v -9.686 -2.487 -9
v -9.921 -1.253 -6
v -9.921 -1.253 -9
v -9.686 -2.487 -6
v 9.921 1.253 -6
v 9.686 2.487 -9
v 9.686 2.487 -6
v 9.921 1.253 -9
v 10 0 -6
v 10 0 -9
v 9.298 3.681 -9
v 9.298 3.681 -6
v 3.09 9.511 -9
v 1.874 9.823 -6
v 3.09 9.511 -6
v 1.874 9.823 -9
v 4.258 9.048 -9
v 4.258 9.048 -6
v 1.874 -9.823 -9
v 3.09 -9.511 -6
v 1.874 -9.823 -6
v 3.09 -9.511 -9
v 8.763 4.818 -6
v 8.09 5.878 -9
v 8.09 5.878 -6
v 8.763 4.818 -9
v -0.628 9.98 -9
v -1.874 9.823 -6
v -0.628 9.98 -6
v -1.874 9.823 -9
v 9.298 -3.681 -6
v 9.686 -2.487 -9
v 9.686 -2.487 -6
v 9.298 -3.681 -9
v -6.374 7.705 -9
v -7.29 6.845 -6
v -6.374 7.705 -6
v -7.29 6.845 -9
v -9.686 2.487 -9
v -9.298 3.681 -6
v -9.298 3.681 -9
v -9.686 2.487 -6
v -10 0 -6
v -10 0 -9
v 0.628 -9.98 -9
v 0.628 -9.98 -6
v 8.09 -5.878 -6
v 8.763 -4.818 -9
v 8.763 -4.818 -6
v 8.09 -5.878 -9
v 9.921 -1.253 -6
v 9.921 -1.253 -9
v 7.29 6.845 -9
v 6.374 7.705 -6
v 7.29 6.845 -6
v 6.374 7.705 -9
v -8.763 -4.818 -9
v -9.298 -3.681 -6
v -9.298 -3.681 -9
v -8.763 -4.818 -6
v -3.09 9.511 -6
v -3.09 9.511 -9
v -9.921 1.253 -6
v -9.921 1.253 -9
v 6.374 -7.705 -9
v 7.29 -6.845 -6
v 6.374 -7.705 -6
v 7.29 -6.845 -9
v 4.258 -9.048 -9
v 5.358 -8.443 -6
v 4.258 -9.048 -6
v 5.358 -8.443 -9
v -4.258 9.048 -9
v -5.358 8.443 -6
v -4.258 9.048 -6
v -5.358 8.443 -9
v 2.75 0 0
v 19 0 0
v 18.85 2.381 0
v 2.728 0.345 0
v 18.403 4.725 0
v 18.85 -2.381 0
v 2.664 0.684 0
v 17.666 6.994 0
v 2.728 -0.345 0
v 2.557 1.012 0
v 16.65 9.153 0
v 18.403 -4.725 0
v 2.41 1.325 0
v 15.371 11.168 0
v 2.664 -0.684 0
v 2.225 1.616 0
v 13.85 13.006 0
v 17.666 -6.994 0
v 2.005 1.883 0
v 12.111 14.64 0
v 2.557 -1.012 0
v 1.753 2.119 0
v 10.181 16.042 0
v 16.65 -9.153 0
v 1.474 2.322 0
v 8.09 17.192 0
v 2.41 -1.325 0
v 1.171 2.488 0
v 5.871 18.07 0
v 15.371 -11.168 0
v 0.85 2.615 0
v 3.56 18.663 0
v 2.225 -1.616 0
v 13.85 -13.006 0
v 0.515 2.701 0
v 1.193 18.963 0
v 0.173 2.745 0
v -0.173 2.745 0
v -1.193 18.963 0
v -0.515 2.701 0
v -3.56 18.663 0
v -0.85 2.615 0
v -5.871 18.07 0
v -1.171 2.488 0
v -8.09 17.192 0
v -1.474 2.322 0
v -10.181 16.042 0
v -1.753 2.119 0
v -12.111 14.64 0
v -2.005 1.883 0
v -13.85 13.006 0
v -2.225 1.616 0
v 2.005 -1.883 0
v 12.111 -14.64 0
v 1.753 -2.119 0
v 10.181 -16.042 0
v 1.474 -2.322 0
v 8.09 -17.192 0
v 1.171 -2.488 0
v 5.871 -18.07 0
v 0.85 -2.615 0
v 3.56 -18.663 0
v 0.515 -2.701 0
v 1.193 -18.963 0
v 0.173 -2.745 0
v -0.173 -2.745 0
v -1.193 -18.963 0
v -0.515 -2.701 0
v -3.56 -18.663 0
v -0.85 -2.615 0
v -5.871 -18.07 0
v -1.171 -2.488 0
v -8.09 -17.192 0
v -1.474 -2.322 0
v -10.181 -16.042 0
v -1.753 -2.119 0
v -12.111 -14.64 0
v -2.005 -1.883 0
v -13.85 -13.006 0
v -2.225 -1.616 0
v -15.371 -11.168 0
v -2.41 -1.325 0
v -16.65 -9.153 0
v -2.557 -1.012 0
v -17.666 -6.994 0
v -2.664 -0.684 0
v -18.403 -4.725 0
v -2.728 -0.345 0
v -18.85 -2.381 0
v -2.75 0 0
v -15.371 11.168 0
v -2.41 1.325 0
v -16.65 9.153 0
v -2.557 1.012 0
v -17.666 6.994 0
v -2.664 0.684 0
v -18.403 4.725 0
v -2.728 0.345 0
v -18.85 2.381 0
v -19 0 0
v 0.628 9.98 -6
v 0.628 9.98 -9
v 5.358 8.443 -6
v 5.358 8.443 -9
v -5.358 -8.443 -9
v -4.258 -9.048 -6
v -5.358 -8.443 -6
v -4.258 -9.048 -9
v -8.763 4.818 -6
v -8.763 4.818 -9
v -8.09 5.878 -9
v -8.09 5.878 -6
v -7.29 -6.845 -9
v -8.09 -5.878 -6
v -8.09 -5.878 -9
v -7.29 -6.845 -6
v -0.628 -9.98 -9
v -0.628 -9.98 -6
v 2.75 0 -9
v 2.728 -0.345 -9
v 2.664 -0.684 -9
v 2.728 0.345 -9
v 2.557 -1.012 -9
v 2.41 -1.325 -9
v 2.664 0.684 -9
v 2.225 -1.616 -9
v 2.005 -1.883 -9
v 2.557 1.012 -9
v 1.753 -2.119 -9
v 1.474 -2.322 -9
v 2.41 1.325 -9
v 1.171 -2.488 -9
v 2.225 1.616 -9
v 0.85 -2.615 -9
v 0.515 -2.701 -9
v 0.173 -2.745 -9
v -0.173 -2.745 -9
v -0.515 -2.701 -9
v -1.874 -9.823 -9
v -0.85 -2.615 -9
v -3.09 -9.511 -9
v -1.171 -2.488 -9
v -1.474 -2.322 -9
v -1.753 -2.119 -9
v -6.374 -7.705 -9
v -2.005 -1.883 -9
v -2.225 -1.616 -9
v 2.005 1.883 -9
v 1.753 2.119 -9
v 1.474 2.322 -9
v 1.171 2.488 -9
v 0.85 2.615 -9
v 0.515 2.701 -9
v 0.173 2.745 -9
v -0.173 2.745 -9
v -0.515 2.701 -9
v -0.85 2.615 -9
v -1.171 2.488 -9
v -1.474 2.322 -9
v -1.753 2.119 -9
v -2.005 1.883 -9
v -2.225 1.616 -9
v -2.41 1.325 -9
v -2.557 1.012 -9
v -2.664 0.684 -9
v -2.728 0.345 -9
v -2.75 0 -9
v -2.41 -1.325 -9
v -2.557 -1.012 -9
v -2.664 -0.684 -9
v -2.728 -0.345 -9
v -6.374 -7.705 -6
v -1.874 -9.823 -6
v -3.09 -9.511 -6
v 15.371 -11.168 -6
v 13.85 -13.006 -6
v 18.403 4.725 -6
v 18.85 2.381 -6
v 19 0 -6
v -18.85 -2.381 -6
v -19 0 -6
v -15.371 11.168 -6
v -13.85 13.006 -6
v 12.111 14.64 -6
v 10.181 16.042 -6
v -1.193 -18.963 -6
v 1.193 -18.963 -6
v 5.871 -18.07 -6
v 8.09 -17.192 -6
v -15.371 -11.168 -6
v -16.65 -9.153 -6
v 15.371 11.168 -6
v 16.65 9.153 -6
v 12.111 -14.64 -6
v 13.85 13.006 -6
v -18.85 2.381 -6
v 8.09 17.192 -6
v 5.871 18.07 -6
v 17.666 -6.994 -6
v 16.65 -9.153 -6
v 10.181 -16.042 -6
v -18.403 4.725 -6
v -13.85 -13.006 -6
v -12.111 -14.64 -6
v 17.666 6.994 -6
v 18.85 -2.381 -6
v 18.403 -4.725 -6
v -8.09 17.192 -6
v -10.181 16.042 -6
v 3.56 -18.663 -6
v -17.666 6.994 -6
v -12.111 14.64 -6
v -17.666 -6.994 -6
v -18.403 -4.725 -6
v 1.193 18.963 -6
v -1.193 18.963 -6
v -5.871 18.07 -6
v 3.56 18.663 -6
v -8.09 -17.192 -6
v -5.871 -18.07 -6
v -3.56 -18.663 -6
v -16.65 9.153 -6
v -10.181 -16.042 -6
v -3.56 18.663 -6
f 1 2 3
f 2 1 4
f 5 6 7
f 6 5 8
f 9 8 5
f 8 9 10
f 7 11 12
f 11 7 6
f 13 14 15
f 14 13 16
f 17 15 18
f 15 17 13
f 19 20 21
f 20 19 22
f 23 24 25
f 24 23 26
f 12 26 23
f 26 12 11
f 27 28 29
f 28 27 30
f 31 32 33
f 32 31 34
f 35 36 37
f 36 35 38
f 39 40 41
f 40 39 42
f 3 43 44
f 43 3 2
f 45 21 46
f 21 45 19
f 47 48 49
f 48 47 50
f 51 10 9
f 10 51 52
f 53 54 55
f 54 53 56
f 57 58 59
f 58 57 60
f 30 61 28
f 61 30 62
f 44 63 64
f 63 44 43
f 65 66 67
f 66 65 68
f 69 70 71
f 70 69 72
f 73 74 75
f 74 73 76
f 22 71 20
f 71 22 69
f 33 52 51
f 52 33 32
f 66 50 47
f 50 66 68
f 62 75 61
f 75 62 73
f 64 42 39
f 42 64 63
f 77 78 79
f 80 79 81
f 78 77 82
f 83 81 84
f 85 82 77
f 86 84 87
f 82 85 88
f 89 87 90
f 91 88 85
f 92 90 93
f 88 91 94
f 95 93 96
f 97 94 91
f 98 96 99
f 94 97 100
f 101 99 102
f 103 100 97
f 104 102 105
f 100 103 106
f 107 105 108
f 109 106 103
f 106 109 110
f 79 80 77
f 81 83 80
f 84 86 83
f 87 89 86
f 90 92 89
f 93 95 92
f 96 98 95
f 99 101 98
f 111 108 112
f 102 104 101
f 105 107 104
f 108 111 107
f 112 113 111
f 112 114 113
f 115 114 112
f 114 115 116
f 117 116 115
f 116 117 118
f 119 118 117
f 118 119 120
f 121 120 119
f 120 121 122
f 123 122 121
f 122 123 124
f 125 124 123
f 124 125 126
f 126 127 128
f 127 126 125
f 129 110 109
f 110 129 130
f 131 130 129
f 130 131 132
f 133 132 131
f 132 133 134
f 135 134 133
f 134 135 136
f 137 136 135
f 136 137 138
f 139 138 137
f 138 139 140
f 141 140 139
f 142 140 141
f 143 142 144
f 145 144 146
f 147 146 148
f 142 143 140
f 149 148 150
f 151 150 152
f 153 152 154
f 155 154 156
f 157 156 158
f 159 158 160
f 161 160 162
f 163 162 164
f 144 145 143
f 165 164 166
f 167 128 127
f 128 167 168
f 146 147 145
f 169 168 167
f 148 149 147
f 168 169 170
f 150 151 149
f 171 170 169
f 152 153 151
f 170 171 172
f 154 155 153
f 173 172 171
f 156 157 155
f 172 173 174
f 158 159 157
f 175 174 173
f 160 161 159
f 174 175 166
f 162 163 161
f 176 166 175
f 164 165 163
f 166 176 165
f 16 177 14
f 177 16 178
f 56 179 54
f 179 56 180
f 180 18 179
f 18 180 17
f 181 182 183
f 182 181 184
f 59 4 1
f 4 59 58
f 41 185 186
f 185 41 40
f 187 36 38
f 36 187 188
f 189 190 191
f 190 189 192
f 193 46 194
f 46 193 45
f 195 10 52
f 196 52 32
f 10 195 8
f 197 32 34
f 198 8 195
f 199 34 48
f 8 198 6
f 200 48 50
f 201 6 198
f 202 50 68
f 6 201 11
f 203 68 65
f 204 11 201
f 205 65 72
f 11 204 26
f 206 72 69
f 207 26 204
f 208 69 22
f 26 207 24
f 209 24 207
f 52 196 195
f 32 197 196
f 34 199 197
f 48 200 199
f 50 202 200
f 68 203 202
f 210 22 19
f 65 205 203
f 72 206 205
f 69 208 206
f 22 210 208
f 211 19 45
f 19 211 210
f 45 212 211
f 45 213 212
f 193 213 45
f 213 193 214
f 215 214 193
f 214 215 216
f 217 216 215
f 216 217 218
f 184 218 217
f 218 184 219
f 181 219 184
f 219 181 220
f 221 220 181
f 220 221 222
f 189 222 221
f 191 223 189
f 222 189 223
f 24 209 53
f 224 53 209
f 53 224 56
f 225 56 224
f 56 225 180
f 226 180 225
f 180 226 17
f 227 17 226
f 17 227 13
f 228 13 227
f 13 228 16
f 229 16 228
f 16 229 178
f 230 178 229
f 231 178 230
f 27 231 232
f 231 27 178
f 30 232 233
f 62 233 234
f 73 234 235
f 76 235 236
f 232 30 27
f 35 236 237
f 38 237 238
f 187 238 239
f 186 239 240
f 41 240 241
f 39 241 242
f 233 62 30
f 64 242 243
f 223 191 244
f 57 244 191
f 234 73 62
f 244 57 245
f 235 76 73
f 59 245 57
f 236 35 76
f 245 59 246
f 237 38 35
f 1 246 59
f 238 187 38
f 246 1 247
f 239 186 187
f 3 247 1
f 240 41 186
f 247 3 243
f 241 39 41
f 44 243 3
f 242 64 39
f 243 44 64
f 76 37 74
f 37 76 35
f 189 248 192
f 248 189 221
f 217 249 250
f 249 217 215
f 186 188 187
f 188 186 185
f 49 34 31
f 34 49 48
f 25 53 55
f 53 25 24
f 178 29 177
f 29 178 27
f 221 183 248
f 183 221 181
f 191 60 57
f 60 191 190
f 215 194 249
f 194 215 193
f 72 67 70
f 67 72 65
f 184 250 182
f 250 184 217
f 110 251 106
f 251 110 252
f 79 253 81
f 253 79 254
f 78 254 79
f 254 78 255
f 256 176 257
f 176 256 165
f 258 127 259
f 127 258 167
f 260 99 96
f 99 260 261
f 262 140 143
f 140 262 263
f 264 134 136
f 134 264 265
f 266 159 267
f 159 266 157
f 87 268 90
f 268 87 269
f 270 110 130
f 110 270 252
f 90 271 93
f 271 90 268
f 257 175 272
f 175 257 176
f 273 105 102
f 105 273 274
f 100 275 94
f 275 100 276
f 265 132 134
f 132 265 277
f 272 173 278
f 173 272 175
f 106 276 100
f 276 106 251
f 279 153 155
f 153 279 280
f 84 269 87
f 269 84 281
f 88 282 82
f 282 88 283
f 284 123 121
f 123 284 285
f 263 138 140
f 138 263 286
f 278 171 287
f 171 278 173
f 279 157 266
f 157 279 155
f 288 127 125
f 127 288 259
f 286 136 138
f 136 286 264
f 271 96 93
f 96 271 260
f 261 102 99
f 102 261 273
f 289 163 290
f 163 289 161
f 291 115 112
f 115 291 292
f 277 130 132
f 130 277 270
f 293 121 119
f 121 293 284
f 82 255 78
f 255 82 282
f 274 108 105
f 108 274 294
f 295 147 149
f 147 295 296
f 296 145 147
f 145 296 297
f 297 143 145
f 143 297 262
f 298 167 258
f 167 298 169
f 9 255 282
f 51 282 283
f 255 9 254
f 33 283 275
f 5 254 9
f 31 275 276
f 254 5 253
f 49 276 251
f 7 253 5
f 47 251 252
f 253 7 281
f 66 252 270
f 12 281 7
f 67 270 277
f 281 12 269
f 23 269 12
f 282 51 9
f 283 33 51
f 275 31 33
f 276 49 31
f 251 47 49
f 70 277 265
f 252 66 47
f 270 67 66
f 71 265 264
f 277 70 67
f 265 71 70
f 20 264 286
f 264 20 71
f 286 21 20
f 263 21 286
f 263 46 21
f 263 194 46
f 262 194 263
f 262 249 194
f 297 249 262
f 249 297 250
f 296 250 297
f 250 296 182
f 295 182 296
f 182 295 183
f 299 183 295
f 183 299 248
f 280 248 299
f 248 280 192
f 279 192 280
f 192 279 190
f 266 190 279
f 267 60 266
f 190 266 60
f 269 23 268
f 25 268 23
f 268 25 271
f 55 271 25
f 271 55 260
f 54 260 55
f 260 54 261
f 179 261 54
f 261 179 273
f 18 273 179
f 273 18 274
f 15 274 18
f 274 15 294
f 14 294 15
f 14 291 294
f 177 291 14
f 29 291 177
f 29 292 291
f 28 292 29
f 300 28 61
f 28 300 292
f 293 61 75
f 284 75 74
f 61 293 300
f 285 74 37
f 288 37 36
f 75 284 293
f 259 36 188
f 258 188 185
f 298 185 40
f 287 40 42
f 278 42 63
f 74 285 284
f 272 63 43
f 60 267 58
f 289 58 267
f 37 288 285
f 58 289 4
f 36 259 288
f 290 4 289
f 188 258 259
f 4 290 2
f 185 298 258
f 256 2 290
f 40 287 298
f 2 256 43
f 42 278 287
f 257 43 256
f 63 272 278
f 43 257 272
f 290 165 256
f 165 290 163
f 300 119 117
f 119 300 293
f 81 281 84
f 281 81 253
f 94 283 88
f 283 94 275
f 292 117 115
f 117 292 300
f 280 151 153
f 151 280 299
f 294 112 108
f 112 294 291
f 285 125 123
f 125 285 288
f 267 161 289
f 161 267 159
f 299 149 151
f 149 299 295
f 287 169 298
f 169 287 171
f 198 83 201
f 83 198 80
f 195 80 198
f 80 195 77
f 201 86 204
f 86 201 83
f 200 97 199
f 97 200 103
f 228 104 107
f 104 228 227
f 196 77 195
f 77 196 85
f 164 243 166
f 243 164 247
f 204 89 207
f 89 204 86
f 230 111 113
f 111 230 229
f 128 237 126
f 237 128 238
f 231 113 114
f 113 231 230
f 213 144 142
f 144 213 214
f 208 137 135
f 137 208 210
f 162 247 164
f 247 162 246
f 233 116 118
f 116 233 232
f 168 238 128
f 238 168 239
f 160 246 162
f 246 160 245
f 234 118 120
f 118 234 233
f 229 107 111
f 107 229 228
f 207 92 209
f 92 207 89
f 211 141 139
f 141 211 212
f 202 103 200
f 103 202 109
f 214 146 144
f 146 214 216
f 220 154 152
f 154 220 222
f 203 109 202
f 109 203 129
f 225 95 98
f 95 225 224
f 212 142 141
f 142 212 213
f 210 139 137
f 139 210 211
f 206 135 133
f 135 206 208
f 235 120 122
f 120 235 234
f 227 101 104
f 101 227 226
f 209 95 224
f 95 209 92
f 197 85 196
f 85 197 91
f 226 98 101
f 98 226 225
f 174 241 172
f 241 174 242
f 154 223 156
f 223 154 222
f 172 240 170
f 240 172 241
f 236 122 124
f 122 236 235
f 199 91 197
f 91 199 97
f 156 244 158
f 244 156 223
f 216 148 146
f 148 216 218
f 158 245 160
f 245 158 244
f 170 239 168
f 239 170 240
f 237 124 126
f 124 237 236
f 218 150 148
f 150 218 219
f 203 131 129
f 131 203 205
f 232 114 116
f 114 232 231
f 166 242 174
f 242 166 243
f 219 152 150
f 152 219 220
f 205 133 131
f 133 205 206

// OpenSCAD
$fn = 50;


difference() {
	union() {
		translate(v = [0, 0, -9.0000000000]) {
			cylinder(h = 9, r = 10.0000000000);
		}
		translate(v = [0, 0, -6.0000000000]) {
			cylinder(h = 6, r = 19.0000000000);
		}
	}
	union() {
		#translate(v = [0, 0, -9]) {
			cylinder(h = 9, r = 2.7500000000);
		}
	}
}
